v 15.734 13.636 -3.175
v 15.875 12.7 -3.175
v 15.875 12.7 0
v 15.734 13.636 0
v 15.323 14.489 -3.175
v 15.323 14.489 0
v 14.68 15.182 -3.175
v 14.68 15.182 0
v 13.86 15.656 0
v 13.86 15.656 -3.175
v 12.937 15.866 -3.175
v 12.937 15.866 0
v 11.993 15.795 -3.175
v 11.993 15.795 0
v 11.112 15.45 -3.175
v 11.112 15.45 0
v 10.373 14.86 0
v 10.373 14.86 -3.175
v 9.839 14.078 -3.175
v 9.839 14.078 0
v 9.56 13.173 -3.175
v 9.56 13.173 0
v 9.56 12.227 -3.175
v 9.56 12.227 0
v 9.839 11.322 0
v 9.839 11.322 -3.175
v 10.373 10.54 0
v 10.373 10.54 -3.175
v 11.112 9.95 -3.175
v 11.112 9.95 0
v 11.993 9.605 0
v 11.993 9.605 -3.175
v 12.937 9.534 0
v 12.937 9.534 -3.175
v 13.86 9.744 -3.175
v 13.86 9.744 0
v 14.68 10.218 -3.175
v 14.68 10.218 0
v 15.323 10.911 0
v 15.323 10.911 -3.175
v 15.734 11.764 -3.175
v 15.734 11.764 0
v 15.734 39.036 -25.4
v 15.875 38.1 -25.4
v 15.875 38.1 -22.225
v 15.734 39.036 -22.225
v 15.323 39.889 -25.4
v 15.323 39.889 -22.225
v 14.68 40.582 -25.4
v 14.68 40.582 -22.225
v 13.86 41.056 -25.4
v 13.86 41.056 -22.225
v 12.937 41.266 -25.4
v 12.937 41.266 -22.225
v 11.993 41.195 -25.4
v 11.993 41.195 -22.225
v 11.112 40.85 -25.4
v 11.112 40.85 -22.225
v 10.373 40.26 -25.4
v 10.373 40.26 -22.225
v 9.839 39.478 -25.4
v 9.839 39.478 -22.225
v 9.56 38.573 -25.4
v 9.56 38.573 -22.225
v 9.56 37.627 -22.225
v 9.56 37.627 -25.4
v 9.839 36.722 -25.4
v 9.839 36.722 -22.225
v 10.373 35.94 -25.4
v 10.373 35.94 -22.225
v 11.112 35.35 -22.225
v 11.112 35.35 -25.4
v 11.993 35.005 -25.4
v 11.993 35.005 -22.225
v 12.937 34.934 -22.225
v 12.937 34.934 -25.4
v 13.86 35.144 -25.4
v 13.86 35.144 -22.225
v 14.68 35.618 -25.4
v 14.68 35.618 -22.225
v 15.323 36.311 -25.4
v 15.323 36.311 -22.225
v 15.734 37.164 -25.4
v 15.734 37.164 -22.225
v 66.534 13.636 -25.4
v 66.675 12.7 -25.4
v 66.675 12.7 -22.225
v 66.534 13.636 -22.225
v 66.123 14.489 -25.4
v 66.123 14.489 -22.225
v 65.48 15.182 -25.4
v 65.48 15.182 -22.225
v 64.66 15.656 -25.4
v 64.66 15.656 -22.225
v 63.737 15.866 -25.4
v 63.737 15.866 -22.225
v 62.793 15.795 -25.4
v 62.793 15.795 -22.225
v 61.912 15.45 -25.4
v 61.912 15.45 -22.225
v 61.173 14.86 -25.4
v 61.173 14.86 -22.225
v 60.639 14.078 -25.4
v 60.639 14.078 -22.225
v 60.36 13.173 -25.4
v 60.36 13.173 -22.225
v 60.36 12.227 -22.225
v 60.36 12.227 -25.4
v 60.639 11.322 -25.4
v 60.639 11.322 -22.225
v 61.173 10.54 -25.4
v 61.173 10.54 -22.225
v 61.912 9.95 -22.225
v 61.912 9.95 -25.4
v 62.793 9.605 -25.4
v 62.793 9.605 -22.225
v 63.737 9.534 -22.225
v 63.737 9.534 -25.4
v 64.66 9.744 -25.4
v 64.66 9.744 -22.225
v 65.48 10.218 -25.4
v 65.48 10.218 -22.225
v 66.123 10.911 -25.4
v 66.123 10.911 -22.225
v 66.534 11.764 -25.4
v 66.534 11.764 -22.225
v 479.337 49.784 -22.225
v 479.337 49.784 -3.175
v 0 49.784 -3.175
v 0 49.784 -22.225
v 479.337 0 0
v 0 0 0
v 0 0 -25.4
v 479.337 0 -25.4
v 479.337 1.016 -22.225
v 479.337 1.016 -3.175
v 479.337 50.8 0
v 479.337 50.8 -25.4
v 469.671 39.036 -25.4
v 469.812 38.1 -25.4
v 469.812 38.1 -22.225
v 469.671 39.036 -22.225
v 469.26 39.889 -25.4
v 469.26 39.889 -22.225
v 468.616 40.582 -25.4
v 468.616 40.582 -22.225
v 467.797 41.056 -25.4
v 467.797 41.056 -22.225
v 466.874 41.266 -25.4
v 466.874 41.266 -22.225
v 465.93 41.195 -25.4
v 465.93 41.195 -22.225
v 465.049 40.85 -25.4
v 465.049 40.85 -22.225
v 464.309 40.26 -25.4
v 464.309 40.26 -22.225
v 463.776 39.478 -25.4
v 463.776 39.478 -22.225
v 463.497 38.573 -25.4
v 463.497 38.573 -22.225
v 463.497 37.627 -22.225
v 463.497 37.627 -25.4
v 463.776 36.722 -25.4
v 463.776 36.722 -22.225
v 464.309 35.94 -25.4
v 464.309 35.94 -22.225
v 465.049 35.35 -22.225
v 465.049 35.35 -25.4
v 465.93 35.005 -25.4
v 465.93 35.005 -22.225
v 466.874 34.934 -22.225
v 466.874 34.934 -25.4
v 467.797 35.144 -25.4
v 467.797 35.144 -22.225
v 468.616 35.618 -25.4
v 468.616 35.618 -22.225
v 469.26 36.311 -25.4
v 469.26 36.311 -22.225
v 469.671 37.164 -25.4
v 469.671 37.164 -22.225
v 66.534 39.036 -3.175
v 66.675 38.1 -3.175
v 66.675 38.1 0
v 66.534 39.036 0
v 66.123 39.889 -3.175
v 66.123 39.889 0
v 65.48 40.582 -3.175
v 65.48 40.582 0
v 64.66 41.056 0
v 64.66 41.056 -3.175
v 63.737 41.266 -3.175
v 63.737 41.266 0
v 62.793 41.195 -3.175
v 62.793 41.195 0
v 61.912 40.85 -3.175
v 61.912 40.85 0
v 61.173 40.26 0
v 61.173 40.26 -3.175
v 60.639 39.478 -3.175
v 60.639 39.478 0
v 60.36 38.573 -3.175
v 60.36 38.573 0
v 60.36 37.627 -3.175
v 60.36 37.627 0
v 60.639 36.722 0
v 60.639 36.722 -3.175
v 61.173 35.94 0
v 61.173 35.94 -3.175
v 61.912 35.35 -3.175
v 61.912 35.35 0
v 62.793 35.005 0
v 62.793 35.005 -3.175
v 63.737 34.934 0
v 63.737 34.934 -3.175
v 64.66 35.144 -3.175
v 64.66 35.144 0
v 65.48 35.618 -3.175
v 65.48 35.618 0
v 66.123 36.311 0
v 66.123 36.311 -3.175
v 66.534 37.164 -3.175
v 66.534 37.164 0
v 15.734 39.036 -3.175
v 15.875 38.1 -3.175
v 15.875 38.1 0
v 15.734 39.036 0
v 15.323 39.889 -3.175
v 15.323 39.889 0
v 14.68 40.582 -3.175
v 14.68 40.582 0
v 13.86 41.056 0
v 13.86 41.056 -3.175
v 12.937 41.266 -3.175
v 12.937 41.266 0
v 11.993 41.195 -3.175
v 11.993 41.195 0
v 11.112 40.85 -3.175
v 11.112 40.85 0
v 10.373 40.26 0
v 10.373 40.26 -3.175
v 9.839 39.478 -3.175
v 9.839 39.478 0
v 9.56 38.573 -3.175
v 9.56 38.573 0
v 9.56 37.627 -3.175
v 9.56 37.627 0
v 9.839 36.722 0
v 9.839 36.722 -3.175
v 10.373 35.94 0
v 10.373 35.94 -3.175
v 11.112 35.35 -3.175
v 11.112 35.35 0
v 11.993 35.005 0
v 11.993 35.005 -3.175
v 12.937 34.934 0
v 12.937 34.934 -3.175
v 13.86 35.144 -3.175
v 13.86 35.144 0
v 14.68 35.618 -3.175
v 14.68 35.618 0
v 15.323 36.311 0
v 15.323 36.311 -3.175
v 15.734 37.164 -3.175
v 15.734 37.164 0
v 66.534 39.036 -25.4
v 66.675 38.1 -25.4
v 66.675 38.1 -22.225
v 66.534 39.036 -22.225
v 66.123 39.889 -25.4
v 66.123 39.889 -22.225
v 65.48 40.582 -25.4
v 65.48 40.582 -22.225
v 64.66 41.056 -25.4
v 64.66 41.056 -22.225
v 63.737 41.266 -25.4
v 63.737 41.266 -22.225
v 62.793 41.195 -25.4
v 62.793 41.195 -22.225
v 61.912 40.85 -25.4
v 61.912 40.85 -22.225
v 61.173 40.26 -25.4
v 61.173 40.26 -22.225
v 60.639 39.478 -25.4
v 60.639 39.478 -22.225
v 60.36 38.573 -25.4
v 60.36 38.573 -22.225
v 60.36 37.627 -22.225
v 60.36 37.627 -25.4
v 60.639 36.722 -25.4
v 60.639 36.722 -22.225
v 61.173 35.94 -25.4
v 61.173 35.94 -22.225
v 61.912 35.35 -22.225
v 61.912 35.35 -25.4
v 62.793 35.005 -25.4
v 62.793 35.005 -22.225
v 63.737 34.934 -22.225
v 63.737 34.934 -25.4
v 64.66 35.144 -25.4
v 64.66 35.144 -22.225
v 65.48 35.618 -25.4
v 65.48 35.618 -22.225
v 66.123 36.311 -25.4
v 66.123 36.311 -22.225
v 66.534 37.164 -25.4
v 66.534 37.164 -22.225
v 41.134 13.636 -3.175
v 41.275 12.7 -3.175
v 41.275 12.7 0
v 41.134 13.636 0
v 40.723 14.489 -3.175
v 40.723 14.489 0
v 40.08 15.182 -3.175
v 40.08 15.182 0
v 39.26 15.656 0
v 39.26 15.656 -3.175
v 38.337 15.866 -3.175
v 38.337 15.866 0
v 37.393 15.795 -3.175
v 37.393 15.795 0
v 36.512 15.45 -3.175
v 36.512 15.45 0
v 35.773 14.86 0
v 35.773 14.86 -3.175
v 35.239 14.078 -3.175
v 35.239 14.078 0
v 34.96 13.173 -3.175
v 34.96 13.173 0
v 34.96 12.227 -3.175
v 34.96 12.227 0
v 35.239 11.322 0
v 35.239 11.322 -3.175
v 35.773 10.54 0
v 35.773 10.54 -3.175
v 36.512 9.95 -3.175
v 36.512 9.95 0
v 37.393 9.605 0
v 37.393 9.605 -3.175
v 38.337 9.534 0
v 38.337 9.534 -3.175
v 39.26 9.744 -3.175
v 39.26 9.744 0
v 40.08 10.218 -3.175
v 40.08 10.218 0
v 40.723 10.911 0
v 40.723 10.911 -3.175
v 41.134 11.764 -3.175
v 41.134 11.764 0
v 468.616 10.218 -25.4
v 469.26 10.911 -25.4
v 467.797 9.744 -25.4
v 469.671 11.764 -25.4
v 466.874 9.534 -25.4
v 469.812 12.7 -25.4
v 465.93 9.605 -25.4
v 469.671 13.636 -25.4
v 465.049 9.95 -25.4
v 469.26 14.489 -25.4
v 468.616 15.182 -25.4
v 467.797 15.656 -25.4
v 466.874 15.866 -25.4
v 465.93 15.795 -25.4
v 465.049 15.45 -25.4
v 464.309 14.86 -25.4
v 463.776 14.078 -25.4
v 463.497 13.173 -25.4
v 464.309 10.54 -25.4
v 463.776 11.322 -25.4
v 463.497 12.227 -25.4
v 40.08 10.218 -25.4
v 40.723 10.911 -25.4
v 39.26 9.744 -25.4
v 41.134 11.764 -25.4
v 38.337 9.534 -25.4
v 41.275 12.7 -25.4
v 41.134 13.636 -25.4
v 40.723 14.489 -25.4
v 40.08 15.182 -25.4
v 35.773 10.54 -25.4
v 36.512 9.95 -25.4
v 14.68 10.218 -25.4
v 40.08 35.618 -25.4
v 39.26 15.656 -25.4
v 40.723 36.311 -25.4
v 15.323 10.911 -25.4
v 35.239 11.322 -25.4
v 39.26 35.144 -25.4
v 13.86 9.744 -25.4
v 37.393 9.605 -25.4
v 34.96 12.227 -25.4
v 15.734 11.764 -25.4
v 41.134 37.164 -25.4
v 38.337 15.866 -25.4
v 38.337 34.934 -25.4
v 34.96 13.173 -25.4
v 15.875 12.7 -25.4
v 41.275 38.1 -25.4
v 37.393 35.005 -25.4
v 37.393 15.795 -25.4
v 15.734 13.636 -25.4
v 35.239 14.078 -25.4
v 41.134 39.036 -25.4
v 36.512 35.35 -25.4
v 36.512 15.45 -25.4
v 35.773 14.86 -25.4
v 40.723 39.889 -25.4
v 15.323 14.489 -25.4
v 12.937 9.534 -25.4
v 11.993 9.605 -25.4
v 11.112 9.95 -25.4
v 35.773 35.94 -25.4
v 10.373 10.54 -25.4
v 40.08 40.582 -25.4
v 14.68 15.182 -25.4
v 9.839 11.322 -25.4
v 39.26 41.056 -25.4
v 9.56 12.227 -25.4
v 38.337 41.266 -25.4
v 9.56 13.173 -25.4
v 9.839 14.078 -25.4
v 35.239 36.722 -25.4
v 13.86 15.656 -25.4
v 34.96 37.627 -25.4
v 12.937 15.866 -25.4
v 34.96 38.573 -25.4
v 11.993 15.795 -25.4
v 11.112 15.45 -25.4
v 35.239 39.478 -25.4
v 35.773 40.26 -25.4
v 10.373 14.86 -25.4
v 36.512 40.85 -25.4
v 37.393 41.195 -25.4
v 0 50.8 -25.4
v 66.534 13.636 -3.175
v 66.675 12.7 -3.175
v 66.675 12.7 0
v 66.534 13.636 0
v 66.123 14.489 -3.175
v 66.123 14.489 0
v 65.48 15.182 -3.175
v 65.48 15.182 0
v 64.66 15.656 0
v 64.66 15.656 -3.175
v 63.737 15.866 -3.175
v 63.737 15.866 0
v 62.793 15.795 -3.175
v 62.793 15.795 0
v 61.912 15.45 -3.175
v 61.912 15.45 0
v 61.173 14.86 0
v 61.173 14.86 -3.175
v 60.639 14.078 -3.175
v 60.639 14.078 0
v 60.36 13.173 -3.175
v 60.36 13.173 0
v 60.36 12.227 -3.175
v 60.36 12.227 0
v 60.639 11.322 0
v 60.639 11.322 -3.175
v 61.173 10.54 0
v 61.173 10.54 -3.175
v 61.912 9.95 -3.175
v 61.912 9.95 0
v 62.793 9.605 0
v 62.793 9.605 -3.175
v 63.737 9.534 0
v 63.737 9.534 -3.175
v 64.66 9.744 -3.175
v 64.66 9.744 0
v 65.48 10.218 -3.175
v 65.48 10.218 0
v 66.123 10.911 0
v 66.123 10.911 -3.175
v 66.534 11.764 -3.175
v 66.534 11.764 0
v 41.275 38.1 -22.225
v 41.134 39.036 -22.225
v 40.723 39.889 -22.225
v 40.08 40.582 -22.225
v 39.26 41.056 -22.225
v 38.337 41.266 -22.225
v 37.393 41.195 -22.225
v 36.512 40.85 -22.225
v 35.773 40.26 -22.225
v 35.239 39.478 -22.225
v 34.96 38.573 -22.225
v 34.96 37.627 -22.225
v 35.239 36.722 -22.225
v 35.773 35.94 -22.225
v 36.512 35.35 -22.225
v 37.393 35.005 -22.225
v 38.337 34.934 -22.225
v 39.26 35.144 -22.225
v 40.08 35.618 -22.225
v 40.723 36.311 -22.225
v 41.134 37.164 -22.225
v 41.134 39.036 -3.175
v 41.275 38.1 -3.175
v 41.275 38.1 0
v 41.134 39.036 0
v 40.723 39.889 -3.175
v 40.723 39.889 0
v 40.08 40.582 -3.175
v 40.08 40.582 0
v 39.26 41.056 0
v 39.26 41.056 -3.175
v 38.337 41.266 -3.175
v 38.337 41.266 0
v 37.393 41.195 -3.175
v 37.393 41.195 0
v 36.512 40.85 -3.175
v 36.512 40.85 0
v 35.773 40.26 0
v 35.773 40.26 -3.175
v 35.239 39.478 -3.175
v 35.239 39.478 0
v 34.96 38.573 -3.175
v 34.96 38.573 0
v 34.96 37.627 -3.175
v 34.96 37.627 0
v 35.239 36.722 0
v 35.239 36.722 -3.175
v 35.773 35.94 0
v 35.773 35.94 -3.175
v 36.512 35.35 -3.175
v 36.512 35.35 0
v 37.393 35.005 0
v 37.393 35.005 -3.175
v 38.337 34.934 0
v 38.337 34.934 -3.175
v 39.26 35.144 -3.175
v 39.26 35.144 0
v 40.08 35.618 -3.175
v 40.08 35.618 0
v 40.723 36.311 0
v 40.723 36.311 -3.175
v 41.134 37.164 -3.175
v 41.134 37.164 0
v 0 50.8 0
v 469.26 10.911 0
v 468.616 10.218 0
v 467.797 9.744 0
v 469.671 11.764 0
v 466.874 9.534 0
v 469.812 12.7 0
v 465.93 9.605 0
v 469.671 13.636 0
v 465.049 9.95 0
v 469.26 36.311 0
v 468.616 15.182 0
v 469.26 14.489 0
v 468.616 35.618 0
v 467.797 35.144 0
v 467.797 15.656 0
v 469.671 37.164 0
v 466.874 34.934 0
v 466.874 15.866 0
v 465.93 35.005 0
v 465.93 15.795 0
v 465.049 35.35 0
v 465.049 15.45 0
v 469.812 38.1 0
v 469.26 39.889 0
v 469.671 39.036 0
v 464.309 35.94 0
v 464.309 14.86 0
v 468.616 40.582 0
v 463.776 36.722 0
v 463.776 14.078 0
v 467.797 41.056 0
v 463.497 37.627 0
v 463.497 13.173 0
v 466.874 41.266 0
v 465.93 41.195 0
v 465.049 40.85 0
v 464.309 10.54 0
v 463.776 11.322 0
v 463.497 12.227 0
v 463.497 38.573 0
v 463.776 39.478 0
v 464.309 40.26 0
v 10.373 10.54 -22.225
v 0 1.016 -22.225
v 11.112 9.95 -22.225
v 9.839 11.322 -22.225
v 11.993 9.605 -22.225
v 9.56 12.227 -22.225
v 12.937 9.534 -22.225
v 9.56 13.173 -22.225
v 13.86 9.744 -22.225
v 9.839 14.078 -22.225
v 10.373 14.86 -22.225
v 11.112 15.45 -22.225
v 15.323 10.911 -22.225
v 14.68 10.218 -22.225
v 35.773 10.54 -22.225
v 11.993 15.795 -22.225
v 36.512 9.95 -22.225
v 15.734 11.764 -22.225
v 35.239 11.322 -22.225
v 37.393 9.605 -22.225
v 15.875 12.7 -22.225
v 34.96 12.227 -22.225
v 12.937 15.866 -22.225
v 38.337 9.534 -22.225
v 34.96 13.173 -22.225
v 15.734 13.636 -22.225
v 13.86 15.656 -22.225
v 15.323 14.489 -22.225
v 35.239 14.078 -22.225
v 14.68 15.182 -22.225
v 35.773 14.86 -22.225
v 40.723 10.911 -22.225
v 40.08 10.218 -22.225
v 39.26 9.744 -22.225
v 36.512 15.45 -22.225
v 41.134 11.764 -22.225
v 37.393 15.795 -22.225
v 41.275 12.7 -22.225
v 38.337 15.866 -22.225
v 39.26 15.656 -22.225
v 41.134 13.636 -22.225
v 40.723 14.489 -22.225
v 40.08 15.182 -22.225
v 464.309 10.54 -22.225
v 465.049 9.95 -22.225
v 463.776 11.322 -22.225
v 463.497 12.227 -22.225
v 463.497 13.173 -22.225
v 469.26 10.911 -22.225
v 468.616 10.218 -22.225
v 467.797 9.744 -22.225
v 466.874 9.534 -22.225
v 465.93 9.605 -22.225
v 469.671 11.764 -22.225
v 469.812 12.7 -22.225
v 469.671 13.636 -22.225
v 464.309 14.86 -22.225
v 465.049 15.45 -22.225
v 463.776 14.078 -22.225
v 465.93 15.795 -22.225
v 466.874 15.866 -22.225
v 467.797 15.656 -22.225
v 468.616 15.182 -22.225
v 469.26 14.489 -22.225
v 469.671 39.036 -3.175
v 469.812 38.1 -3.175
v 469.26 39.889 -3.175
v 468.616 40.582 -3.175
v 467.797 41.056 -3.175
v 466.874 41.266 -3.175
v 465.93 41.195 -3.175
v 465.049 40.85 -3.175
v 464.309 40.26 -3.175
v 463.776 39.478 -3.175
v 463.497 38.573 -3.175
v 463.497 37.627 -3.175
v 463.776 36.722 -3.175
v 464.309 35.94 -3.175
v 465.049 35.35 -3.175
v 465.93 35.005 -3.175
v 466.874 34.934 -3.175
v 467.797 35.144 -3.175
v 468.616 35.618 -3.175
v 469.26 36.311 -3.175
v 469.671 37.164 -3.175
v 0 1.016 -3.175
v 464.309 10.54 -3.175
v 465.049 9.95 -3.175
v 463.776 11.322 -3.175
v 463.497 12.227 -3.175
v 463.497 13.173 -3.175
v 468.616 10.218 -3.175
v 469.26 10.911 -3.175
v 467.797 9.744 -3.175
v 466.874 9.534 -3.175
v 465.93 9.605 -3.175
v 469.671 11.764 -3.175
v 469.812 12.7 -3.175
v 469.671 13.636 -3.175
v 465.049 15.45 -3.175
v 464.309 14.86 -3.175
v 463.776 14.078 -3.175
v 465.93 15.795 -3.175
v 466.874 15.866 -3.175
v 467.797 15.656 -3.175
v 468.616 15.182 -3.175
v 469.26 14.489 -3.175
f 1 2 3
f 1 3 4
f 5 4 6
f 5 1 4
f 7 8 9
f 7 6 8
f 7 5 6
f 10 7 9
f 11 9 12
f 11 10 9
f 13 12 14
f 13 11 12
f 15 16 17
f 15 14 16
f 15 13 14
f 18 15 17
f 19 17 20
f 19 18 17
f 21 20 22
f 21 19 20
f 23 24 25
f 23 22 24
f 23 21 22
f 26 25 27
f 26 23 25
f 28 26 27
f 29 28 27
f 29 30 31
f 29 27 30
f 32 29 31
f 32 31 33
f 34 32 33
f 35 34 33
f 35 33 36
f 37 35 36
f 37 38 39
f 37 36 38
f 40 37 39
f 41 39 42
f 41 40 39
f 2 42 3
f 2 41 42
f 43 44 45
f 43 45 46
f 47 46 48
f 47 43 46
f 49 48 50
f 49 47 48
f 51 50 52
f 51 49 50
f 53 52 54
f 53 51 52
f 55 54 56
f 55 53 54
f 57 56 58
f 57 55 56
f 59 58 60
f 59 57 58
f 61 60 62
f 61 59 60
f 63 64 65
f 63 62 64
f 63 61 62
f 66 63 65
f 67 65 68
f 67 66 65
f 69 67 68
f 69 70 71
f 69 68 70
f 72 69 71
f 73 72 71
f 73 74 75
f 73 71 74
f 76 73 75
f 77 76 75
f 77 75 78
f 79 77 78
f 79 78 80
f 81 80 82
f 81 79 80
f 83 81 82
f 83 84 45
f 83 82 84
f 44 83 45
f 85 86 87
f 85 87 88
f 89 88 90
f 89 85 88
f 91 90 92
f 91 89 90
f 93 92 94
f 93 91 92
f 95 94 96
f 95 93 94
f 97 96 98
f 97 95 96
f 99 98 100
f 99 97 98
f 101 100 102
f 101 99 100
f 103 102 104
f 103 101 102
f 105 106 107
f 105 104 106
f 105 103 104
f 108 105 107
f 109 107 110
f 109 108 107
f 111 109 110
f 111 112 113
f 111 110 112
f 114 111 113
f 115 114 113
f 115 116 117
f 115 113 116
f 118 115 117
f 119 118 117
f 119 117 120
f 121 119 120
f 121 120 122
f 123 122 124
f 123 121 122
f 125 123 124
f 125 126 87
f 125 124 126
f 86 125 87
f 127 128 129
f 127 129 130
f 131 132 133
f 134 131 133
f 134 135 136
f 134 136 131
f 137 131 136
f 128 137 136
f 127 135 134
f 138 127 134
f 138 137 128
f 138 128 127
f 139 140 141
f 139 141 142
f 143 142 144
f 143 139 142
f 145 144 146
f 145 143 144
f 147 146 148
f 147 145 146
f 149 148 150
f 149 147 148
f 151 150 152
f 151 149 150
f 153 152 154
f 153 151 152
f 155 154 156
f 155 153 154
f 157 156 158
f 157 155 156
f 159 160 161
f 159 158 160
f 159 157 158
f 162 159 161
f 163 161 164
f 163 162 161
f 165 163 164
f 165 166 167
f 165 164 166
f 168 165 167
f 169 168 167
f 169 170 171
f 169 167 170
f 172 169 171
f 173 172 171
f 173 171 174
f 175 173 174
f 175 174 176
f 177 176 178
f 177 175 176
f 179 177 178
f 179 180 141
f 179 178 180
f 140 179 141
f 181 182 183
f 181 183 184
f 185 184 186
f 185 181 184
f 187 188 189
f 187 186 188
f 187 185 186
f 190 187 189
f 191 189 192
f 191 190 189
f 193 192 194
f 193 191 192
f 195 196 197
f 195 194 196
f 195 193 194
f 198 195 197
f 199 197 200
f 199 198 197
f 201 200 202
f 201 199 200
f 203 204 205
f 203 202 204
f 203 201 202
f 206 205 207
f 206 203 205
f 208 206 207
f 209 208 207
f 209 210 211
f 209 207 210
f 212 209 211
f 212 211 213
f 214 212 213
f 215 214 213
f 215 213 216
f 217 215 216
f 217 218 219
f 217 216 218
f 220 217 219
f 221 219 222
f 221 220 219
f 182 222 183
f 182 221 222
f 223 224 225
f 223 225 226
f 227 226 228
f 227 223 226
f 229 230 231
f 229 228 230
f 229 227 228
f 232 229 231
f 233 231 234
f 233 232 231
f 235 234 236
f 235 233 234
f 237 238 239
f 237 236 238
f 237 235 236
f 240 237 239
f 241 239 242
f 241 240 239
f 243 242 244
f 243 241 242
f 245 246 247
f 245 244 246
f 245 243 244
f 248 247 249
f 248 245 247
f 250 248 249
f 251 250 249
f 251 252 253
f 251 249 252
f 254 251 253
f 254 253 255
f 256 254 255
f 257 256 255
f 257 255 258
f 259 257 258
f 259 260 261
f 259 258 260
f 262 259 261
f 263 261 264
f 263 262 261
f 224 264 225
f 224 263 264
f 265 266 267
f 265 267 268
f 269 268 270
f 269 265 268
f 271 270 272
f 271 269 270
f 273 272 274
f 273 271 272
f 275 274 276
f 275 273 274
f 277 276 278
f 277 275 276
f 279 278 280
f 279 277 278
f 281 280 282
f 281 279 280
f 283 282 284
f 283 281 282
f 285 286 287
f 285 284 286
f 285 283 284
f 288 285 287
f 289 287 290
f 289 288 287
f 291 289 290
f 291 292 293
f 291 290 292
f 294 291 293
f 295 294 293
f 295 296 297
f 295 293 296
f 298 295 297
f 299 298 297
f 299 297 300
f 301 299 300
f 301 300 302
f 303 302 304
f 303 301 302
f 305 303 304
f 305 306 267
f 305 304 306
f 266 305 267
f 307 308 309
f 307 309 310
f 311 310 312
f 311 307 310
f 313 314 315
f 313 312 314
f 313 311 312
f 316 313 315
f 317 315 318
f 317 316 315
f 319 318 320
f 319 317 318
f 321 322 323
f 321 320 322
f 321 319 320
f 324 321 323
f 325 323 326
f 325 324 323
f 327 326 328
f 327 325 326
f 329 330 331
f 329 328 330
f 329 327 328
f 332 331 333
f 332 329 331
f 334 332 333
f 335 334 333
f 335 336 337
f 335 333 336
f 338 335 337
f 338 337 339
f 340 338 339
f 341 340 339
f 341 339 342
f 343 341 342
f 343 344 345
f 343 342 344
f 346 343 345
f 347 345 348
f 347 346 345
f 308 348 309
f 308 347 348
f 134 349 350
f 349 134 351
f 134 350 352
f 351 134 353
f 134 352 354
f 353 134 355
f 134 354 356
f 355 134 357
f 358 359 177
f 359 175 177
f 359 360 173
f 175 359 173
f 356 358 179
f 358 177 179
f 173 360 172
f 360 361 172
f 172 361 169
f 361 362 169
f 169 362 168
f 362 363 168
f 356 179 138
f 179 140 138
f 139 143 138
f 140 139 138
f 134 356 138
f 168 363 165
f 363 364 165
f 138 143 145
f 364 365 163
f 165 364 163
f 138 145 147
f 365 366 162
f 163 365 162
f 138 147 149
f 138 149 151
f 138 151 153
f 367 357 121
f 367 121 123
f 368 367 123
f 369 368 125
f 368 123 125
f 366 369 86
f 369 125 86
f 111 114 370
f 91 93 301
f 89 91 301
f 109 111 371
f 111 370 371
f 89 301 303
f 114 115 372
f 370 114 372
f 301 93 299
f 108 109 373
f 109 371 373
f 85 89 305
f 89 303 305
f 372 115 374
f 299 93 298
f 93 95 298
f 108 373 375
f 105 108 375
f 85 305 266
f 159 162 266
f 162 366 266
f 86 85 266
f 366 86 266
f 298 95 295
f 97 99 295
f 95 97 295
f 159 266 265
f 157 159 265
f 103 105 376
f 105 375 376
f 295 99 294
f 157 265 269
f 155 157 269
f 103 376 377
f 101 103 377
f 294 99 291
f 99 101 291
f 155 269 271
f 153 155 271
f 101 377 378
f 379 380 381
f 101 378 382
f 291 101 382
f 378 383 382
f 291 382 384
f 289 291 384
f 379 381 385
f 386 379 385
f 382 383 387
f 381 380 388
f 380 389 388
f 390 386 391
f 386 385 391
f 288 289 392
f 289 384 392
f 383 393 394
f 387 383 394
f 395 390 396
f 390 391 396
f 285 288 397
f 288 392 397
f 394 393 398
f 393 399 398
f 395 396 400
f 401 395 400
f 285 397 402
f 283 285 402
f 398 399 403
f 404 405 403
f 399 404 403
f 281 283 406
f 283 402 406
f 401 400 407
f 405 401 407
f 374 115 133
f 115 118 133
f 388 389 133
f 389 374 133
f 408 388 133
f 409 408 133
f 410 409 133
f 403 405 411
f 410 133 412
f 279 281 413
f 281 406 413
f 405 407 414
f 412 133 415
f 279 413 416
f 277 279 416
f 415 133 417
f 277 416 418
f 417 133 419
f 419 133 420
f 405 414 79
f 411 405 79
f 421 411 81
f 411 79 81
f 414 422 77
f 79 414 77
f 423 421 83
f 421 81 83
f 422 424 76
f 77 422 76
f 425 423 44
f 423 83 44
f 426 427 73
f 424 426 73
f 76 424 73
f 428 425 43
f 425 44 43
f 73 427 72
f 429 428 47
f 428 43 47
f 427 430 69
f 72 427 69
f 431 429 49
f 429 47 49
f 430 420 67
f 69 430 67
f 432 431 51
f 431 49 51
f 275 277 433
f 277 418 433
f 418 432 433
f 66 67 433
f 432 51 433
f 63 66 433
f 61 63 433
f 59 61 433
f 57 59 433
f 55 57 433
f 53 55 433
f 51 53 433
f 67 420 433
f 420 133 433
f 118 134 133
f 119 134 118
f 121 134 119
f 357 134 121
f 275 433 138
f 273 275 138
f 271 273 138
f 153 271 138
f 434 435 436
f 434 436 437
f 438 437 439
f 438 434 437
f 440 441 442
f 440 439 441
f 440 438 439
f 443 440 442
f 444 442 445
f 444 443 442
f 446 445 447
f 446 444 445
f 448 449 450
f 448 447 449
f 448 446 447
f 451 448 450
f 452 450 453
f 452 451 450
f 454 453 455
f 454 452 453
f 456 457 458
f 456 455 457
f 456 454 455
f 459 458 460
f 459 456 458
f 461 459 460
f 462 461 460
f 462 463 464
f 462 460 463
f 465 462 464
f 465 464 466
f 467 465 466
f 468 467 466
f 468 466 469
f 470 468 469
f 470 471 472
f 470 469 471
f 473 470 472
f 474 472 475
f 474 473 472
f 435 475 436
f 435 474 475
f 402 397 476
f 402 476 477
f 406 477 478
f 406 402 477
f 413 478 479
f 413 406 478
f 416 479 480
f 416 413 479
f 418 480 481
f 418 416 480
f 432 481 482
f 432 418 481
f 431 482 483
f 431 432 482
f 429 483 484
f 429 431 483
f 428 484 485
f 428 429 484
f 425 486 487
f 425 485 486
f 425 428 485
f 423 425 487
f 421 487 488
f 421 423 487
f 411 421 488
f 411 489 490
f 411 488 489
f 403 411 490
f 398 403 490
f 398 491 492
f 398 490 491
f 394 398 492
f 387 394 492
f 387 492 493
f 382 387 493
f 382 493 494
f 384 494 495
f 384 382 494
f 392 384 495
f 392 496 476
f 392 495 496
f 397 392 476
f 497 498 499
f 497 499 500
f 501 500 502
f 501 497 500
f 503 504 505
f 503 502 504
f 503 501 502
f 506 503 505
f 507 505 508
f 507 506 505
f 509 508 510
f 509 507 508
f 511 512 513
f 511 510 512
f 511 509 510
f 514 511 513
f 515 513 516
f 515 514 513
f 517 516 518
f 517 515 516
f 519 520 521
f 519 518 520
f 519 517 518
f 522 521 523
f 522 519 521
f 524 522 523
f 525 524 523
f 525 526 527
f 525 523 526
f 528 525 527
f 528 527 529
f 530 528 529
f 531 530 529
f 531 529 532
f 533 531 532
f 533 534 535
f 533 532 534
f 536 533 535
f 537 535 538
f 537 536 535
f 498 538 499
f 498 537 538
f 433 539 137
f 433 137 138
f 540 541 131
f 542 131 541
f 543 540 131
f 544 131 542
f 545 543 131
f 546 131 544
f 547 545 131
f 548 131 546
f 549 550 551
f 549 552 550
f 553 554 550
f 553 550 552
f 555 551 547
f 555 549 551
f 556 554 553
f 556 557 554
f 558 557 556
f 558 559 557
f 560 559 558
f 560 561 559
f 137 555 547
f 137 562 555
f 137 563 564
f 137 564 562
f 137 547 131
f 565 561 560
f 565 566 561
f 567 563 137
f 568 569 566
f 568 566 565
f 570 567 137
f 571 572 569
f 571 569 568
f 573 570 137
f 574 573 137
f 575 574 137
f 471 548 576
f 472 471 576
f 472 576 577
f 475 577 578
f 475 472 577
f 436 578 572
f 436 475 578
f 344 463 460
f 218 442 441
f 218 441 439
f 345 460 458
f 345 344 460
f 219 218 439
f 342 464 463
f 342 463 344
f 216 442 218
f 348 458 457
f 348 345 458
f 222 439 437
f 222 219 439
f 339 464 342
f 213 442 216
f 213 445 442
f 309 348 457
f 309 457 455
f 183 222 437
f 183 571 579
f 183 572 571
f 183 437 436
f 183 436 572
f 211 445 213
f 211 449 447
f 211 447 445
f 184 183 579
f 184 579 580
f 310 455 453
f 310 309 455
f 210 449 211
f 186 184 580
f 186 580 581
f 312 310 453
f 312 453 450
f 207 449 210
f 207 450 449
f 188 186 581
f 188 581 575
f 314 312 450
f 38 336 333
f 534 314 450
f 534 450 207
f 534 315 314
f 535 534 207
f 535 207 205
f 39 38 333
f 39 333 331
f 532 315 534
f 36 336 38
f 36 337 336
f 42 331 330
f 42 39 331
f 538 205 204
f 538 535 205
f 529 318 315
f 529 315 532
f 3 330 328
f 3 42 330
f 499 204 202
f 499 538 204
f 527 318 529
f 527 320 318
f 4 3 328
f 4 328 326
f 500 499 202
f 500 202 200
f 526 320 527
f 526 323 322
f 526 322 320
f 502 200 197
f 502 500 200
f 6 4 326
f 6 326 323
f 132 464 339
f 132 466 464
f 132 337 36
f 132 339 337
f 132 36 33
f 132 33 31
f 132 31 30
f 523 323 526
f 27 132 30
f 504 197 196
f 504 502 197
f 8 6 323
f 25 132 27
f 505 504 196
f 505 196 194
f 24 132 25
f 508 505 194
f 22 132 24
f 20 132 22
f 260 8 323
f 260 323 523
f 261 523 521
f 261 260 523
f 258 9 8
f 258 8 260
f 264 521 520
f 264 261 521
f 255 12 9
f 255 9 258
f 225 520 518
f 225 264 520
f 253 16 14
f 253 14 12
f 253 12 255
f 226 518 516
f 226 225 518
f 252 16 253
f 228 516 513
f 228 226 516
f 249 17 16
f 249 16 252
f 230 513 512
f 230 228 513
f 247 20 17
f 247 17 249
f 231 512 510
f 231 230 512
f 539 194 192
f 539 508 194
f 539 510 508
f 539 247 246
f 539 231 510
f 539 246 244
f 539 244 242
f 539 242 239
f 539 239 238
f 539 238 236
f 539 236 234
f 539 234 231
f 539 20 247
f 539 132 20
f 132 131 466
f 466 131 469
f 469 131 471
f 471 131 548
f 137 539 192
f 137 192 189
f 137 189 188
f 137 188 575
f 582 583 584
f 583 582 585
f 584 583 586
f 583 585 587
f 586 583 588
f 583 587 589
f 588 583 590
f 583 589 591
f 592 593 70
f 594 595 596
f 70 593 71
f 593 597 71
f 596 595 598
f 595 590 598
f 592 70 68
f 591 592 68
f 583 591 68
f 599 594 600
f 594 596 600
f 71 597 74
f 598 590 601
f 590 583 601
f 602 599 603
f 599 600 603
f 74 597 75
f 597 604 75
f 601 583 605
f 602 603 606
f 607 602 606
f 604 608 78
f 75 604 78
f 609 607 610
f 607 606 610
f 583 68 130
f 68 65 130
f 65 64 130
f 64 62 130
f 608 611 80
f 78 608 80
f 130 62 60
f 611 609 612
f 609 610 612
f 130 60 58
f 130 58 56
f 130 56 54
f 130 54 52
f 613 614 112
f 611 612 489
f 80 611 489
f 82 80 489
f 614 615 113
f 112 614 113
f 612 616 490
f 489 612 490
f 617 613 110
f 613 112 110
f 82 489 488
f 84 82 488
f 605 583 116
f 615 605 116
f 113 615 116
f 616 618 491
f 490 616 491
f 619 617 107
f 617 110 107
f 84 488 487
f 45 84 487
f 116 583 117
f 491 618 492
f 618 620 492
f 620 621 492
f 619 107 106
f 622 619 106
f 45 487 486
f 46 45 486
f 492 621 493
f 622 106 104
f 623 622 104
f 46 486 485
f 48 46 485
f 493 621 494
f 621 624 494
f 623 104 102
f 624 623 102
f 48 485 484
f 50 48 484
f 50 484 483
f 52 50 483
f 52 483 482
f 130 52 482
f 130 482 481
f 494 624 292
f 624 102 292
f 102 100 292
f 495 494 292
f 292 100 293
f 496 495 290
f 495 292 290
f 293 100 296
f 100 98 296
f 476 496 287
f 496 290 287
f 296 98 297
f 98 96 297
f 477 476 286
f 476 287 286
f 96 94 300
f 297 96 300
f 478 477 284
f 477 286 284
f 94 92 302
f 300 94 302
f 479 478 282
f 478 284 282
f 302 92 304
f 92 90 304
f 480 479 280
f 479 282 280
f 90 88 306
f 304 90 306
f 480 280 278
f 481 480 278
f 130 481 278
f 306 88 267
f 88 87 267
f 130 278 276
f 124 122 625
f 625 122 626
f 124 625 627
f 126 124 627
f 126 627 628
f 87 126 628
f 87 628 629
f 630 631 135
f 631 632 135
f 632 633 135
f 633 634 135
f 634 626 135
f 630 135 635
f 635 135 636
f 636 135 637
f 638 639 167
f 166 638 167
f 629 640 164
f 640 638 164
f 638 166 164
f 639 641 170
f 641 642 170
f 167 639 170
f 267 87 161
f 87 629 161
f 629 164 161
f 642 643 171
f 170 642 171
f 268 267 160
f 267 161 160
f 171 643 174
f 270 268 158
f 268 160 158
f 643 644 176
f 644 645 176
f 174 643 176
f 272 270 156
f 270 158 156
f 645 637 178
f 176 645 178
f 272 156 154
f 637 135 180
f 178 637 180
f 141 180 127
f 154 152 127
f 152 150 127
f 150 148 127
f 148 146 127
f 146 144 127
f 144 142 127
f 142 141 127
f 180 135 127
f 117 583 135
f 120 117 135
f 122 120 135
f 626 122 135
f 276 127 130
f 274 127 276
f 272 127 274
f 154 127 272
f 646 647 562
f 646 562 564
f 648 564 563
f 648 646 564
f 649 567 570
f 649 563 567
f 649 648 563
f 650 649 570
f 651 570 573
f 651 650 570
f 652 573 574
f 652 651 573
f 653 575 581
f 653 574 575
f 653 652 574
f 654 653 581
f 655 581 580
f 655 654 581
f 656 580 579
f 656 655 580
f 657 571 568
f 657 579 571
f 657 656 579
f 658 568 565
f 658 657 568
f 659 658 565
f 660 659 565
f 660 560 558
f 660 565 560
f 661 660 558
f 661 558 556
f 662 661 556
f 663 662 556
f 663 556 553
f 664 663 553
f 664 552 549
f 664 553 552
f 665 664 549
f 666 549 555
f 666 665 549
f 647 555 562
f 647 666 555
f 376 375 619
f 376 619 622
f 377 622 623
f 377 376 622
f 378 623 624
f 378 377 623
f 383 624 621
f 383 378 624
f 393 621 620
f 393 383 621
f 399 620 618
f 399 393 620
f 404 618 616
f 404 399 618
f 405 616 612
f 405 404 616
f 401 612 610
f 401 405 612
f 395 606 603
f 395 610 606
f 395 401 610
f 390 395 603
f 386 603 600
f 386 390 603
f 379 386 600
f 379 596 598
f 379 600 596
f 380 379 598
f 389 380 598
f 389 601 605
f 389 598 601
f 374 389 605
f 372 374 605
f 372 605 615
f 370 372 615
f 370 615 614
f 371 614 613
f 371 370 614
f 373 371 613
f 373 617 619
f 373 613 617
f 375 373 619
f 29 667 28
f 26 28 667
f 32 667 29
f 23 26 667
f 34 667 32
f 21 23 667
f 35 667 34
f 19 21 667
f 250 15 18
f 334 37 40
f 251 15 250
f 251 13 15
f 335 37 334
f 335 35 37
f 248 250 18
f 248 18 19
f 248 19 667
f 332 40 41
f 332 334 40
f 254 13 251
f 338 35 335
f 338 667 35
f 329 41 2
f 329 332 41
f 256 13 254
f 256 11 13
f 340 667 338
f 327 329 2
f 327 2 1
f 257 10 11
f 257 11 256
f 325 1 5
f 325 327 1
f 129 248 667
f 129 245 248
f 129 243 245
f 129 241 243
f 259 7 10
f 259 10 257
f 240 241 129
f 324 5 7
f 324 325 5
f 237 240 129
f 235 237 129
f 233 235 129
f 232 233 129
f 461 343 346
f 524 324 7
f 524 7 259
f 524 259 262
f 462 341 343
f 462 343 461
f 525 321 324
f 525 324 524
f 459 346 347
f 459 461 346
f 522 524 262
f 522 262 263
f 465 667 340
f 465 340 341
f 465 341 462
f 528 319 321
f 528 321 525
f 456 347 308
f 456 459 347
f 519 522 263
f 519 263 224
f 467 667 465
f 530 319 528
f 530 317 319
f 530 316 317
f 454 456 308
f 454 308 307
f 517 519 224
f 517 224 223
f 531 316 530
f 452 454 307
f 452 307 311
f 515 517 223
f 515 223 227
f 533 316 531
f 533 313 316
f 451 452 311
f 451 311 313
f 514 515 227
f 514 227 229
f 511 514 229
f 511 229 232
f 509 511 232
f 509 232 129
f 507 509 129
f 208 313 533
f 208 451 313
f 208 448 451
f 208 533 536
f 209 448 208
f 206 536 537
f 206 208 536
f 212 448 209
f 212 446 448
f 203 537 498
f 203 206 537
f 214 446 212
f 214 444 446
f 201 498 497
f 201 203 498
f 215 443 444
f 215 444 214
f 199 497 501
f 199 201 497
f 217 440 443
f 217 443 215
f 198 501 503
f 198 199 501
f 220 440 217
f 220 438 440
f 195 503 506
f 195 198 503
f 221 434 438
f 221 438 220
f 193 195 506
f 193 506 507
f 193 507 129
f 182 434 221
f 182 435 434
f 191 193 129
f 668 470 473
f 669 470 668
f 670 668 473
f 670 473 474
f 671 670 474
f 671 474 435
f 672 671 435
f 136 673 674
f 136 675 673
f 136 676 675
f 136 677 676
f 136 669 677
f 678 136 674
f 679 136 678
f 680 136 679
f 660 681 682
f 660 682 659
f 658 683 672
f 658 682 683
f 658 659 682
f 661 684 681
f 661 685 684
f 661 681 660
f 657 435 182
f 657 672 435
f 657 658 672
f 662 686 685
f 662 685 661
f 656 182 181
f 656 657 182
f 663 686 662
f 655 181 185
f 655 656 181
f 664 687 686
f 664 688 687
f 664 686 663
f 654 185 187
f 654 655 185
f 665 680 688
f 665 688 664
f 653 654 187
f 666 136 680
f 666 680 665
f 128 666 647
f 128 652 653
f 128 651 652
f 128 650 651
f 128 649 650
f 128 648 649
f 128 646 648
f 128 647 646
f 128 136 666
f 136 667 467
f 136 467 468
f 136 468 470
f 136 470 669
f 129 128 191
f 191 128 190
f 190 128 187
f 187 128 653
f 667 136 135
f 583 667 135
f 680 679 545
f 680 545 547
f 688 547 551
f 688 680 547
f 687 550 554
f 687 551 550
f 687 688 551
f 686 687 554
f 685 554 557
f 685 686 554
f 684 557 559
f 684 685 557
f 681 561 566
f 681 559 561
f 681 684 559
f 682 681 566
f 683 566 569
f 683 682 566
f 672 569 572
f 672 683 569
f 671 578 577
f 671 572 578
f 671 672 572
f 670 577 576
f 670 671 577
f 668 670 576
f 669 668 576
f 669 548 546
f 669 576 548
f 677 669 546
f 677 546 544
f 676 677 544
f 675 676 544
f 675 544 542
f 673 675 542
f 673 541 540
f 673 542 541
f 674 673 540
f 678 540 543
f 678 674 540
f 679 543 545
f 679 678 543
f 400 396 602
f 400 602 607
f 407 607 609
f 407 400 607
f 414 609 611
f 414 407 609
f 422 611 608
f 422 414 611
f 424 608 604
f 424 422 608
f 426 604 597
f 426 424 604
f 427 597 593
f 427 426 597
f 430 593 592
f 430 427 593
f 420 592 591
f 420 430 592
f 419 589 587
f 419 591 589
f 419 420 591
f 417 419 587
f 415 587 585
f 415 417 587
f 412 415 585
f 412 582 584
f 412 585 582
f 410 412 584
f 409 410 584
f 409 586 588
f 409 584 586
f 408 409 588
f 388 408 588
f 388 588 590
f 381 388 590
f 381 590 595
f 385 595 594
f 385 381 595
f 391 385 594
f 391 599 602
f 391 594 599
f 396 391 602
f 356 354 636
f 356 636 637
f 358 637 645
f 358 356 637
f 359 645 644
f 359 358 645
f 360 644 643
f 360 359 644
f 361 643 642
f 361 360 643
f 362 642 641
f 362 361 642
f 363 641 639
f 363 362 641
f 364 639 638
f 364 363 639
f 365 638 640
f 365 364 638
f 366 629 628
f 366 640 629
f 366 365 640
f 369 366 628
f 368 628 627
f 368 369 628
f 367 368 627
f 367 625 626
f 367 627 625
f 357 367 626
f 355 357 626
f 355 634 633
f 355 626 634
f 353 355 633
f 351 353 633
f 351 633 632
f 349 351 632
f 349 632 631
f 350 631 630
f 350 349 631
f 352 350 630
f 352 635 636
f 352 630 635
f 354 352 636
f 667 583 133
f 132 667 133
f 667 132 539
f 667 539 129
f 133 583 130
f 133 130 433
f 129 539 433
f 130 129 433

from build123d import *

# Parameters (mm, degrees)
SKETCH1_W               = 25.4
SKETCH1_H               = 50.8
BOSS_EXTRUDE1_DEPTH     = 479.336862
SKETCH2_W               = 19.05
SKETCH2_H               = 48.768
CUT_EXTRUDE1_DEPTH      = 483.689990855
CUT_EXTRUDE4_DEPTH      = 483.689990855
CUT_EXTRUDE4_DEPTH_BACK = 483.689990855
SKETCH5_R               = 3.175


with BuildPart() as part:
    # Sketch1 → Boss-Extrude1 (new body)
    with BuildSketch(Plane(origin=(0, 0, 0), x_dir=(0, 0, -1), z_dir=(1, 0, 0))):
        with Locations((12.7, 25.4)):
            Rectangle(SKETCH1_W, SKETCH1_H)
    extrude(amount=BOSS_EXTRUDE1_DEPTH)

    # Sketch2 → Cut-Extrude1 (cut, through all)
    with BuildSketch(Plane(origin=(479.336862, 0, 0), x_dir=(0, 0, -1), z_dir=(1, 0, 0))):
        with Locations((12.7, 25.4)):
            Rectangle(SKETCH2_W, SKETCH2_H)
    extrude(amount=-CUT_EXTRUDE1_DEPTH, mode=Mode.SUBTRACT)

    # Sketch5 → Cut-Extrude4 (cut, two sides: drawn at the far end of the back side and taken through both)
    with BuildSketch(Plane.XY.offset(-CUT_EXTRUDE4_DEPTH_BACK)):
        with Locations((12.7, 38.1)):
            Circle(SKETCH5_R)
        with Locations((38.1, 38.1)):
            Circle(SKETCH5_R)
        with Locations((12.7, 12.7)):
            Circle(SKETCH5_R)
        with Locations((38.1, 12.7)):
            Circle(SKETCH5_R)
        with Locations((63.5, 38.1)):
            Circle(SKETCH5_R)
        with Locations((63.5, 12.7)):
            Circle(SKETCH5_R)
        with Locations((466.636862, 38.1)):
            Circle(SKETCH5_R)
        with Locations((466.636862, 12.7)):
            Circle(SKETCH5_R)
    extrude(amount=CUT_EXTRUDE4_DEPTH + CUT_EXTRUDE4_DEPTH_BACK, mode=Mode.SUBTRACT)


solid = part.part
